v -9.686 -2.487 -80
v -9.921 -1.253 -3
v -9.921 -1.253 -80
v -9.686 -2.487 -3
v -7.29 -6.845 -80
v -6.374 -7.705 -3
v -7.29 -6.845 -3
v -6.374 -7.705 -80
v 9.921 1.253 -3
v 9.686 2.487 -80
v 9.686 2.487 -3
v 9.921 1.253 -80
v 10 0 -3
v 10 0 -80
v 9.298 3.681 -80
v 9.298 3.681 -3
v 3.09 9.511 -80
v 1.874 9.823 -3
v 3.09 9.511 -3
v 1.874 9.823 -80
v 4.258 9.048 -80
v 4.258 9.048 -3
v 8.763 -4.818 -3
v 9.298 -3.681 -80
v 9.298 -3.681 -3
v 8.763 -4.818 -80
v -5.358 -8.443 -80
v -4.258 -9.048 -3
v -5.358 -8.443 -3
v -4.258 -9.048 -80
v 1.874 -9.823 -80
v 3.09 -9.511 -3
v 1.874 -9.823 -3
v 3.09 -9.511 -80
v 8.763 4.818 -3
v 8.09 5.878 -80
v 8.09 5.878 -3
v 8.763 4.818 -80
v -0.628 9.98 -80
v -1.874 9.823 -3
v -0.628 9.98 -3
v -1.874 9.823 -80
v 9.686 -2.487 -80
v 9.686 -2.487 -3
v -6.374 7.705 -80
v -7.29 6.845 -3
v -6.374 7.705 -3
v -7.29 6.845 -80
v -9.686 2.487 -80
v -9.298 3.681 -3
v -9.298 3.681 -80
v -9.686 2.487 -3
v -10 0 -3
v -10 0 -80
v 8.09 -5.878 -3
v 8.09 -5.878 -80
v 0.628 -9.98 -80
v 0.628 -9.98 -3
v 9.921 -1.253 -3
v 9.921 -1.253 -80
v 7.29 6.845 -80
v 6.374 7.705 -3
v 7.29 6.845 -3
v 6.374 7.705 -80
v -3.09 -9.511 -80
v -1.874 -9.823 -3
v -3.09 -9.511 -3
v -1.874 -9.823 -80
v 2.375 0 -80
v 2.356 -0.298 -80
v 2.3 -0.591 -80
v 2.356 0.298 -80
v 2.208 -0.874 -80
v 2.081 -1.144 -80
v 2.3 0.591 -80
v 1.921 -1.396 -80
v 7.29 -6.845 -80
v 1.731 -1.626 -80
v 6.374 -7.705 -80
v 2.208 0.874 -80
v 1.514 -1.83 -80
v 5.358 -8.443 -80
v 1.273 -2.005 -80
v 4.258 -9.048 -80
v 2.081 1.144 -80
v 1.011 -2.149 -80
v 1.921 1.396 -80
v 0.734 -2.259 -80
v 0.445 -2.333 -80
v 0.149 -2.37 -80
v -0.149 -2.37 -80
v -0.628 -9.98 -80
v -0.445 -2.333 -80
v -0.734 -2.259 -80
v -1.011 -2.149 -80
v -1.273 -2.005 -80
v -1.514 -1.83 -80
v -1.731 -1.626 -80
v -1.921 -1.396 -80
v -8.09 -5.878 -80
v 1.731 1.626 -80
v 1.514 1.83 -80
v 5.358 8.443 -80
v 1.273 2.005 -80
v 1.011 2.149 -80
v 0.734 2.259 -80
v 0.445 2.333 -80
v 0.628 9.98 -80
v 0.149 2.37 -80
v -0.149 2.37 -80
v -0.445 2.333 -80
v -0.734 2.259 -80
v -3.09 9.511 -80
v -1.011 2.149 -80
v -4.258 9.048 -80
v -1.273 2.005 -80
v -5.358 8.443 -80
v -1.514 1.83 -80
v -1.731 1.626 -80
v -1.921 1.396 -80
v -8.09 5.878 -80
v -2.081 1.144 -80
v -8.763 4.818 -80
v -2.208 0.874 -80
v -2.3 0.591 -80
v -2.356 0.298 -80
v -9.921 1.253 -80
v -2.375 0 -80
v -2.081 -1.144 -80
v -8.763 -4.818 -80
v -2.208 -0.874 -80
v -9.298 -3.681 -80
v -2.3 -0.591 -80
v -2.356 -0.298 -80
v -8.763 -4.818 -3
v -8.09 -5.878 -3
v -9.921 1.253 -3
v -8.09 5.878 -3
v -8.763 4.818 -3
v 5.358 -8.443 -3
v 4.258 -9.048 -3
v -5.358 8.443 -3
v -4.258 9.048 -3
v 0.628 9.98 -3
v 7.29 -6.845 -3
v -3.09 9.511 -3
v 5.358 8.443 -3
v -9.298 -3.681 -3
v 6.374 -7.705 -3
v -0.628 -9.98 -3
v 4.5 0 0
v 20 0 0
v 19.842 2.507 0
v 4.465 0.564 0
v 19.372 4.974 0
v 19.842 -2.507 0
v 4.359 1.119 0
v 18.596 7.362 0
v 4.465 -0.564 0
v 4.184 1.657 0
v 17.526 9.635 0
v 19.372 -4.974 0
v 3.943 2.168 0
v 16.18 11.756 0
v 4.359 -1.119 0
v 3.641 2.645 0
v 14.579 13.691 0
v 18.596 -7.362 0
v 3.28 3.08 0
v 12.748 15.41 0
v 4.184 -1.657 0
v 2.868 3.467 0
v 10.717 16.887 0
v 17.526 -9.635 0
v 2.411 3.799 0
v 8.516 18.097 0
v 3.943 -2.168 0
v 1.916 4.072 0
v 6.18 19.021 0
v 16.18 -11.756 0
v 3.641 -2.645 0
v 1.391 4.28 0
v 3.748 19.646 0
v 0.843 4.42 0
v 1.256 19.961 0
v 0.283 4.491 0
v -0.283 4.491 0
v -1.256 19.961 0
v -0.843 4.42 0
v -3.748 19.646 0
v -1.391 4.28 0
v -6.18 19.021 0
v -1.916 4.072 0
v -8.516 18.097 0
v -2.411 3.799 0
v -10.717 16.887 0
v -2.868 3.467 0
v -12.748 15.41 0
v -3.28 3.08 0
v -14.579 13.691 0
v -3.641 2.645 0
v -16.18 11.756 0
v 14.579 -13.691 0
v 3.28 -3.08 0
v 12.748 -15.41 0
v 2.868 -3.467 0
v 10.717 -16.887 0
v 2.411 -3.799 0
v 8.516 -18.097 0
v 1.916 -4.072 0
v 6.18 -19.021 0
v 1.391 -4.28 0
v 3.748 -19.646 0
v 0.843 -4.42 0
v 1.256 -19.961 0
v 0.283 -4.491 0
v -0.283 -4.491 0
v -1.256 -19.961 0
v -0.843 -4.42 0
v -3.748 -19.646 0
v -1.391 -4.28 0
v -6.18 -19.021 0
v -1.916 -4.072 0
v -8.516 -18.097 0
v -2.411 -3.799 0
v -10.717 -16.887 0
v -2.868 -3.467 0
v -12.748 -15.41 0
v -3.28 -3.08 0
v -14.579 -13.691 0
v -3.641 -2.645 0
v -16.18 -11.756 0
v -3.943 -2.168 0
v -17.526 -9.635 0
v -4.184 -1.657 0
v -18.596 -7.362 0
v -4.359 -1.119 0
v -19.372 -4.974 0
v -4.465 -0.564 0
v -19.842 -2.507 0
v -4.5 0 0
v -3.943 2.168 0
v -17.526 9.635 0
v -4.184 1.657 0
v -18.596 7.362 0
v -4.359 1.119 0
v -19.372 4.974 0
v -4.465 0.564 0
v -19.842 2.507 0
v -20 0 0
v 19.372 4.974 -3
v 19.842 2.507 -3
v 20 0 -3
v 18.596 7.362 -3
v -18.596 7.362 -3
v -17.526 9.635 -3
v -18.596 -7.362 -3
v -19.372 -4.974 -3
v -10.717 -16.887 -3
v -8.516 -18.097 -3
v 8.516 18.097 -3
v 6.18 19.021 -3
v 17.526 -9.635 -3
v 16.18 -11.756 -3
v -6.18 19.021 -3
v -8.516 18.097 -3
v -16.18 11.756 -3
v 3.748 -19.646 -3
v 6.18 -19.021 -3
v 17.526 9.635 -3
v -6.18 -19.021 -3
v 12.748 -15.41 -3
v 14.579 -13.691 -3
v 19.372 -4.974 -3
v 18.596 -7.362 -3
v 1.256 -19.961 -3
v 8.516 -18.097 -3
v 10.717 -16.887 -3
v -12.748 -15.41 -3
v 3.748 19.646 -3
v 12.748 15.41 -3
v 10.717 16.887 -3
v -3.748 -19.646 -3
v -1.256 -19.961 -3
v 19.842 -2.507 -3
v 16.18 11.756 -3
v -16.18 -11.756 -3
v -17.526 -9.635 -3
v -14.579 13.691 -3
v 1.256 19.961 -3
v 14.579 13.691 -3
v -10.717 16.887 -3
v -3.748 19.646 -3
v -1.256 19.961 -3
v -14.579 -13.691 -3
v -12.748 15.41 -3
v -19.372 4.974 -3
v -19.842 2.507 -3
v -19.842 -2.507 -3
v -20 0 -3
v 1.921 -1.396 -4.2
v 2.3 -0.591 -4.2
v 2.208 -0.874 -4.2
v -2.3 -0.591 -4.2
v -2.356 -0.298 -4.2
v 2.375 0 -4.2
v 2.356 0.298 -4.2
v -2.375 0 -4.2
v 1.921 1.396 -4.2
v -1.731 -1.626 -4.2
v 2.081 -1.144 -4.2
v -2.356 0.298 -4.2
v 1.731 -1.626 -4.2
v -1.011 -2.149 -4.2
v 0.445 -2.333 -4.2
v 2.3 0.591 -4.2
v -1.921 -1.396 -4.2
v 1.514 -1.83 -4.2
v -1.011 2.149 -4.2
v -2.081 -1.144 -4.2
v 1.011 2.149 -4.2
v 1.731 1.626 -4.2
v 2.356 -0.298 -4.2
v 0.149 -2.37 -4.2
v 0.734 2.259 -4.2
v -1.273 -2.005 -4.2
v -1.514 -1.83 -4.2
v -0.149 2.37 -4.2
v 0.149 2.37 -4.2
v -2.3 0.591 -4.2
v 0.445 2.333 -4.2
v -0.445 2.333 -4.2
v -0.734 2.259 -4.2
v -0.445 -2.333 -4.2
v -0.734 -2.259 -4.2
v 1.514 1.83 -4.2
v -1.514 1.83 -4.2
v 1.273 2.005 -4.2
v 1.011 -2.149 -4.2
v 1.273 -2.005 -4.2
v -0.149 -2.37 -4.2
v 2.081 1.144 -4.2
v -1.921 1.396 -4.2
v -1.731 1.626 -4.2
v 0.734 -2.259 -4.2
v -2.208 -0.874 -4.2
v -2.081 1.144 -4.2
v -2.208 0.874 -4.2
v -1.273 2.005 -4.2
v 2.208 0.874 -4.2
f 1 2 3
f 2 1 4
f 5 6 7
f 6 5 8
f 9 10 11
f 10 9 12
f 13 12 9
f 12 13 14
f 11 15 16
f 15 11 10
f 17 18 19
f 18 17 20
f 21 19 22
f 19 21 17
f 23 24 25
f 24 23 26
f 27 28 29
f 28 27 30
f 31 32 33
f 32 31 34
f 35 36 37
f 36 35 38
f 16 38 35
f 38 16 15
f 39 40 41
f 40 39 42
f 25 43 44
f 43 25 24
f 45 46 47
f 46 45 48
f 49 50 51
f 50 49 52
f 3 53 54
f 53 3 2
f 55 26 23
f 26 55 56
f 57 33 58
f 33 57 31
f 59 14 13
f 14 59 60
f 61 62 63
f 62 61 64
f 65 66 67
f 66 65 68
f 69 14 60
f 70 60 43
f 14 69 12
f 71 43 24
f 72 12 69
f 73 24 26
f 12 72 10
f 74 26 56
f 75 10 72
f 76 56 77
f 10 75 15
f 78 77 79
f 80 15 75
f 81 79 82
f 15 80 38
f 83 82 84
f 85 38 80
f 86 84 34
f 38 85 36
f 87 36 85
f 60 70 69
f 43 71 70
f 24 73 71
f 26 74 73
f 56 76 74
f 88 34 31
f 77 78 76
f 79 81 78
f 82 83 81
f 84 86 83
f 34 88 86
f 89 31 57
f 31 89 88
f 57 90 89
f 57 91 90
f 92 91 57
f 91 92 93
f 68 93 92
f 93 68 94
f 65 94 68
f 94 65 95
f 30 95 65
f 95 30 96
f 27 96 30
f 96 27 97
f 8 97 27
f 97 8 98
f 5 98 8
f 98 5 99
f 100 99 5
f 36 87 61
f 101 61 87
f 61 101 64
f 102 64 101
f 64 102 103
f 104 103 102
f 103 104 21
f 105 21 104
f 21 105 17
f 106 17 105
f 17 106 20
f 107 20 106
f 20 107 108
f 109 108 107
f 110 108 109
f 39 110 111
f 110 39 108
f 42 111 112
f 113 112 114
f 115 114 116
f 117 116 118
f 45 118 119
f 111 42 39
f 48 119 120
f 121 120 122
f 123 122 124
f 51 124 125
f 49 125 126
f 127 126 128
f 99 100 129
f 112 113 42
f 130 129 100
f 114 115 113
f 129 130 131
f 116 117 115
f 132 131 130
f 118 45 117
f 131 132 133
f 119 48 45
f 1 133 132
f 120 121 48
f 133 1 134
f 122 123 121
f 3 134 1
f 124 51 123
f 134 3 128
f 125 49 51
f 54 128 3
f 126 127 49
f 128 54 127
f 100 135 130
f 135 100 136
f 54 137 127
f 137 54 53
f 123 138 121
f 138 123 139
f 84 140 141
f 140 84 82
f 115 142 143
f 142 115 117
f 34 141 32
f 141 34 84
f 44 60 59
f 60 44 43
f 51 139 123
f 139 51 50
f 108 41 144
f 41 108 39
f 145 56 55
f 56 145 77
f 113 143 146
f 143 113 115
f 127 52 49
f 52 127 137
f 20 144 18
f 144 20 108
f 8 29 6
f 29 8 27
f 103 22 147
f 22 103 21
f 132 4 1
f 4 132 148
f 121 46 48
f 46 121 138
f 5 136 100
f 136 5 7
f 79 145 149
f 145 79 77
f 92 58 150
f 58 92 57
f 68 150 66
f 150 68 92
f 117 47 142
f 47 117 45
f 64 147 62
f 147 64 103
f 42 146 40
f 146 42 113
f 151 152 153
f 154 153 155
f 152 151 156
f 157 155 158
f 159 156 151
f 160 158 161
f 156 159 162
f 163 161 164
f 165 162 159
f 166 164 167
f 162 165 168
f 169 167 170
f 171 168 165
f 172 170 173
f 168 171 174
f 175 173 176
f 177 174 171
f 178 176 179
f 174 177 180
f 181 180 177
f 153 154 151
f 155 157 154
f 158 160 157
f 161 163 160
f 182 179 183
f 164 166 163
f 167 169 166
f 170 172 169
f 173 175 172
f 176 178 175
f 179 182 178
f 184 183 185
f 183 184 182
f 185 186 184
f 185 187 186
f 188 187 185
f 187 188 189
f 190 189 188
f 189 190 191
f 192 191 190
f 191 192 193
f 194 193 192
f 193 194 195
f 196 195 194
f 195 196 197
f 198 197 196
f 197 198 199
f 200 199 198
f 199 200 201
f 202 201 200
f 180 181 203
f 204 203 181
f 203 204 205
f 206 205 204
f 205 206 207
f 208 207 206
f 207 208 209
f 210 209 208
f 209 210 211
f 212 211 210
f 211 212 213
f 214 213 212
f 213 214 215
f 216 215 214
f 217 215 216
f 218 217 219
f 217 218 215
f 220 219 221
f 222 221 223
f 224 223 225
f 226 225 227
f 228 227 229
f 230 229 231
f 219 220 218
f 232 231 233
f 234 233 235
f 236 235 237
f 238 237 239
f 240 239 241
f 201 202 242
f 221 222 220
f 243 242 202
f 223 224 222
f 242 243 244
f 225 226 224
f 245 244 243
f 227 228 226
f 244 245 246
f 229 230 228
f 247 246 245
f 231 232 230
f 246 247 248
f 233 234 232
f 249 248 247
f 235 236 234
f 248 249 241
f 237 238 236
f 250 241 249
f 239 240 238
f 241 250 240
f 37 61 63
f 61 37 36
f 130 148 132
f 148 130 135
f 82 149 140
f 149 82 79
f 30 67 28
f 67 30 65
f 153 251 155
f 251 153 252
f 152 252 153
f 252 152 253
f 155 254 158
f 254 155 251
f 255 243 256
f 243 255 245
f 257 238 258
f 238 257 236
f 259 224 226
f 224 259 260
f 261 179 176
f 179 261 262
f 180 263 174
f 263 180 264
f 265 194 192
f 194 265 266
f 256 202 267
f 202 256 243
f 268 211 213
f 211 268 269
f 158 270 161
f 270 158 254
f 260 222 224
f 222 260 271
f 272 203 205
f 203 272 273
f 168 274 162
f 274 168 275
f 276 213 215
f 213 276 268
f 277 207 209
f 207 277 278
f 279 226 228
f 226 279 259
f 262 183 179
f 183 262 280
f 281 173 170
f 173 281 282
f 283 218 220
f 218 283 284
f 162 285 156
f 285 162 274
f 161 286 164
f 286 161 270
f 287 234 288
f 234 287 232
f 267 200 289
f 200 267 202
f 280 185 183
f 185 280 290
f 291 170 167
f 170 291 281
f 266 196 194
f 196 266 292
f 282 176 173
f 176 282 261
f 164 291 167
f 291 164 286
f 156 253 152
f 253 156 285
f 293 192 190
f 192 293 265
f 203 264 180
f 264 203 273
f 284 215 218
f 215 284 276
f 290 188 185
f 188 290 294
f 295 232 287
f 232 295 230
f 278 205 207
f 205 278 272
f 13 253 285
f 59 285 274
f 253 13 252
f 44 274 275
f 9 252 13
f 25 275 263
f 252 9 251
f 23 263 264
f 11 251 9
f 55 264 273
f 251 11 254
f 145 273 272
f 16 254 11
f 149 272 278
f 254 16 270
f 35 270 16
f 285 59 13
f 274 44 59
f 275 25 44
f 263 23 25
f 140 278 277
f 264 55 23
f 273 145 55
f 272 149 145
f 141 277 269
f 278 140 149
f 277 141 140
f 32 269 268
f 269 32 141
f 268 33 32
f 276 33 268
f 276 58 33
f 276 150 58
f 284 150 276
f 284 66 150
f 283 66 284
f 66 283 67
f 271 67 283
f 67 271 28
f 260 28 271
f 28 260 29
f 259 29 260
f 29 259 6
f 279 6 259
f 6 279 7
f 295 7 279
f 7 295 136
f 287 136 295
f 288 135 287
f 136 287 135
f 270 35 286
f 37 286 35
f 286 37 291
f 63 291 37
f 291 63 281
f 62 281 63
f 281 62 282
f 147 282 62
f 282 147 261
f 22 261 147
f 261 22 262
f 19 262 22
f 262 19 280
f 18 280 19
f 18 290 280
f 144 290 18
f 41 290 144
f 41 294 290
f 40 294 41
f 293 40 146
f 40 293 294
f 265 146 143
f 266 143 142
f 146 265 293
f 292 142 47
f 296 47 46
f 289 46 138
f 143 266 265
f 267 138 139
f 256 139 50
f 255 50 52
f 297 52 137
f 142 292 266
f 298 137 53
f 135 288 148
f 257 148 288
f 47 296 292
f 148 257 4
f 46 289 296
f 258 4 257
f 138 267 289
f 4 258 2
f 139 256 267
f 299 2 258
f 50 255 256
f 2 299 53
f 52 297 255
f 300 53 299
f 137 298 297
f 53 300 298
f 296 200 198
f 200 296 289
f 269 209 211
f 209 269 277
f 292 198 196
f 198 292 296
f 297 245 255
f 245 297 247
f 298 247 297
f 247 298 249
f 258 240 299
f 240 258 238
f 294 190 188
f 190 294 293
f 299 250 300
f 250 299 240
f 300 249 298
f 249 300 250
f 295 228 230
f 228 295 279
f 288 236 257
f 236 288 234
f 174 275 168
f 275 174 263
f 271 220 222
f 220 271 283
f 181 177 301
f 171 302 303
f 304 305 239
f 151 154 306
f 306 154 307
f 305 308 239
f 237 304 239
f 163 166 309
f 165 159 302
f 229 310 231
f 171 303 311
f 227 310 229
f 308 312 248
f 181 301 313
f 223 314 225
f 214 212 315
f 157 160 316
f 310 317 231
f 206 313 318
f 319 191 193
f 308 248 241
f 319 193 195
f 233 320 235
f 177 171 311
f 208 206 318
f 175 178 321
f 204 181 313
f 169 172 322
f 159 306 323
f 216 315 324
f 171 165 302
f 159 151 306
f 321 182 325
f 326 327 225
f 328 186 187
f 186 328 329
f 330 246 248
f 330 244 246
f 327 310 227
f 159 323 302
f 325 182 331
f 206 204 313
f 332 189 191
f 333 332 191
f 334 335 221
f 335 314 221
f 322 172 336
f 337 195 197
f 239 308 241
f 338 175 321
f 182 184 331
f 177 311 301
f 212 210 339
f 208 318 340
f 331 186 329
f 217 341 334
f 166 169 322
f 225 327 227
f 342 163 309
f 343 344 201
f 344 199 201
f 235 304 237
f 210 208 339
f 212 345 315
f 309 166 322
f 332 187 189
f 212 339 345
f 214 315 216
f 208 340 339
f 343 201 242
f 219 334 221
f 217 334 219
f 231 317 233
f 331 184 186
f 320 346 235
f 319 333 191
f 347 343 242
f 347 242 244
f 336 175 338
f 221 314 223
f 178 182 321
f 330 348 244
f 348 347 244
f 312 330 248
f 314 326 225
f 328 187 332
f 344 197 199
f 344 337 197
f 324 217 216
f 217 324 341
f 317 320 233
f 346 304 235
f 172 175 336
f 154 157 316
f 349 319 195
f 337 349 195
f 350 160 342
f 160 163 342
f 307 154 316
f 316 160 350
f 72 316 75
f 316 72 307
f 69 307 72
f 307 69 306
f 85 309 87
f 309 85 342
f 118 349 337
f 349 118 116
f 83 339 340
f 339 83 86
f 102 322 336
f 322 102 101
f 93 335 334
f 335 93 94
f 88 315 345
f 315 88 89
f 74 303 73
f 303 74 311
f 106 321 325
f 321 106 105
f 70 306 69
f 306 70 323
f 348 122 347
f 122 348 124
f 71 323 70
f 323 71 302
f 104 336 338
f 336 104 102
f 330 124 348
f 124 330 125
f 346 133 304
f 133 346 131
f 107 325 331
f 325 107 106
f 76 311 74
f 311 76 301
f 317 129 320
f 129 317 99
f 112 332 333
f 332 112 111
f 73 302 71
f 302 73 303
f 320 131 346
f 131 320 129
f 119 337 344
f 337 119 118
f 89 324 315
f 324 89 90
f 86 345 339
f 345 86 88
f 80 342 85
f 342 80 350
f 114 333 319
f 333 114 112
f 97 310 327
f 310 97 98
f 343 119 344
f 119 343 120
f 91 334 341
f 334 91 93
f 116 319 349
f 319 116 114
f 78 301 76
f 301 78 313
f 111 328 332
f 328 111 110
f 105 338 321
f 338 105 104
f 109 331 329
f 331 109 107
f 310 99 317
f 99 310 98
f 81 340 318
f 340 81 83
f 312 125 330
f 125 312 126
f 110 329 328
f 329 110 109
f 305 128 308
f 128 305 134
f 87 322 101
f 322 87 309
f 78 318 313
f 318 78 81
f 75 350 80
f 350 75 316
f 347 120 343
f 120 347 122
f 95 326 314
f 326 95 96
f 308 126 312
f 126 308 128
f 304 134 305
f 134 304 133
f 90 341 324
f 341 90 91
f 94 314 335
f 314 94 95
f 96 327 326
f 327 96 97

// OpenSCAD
$fn = 50;


difference() {
	union() {
		translate(v = [0, 0, -80.0000000000]) {
			cylinder(h = 80, r = 10.0000000000);
		}
		translate(v = [0, 0, -3.0000000000]) {
			cylinder(h = 3, r = 20.0000000000);
		}
	}
	union() {
		translate(v = [0, 0, 0]) {
			rotate(a = [0, 0, 0]) {
				difference() {
					union() {
						#translate(v = [0, 0, -80.0000000000]) {
							cylinder(h = 80, r = 2.2500000000);
						}
						#translate(v = [0, 0, -4.2000000000]) {
							cylinder(h = 4.2000000000, r = 10.0000000000, r1 = 2.3750000000, r2 = 4.5000000000);
						}
						#translate(v = [0, 0, -80.0000000000]) {
							cylinder(h = 80, r = 2.3750000000);
						}
						#translate(v = [0, 0, -80.0000000000]) {
							cylinder(h = 80, r = 2.2500000000);
						}
					}
					union();
				}
			}
		}
	}
}
